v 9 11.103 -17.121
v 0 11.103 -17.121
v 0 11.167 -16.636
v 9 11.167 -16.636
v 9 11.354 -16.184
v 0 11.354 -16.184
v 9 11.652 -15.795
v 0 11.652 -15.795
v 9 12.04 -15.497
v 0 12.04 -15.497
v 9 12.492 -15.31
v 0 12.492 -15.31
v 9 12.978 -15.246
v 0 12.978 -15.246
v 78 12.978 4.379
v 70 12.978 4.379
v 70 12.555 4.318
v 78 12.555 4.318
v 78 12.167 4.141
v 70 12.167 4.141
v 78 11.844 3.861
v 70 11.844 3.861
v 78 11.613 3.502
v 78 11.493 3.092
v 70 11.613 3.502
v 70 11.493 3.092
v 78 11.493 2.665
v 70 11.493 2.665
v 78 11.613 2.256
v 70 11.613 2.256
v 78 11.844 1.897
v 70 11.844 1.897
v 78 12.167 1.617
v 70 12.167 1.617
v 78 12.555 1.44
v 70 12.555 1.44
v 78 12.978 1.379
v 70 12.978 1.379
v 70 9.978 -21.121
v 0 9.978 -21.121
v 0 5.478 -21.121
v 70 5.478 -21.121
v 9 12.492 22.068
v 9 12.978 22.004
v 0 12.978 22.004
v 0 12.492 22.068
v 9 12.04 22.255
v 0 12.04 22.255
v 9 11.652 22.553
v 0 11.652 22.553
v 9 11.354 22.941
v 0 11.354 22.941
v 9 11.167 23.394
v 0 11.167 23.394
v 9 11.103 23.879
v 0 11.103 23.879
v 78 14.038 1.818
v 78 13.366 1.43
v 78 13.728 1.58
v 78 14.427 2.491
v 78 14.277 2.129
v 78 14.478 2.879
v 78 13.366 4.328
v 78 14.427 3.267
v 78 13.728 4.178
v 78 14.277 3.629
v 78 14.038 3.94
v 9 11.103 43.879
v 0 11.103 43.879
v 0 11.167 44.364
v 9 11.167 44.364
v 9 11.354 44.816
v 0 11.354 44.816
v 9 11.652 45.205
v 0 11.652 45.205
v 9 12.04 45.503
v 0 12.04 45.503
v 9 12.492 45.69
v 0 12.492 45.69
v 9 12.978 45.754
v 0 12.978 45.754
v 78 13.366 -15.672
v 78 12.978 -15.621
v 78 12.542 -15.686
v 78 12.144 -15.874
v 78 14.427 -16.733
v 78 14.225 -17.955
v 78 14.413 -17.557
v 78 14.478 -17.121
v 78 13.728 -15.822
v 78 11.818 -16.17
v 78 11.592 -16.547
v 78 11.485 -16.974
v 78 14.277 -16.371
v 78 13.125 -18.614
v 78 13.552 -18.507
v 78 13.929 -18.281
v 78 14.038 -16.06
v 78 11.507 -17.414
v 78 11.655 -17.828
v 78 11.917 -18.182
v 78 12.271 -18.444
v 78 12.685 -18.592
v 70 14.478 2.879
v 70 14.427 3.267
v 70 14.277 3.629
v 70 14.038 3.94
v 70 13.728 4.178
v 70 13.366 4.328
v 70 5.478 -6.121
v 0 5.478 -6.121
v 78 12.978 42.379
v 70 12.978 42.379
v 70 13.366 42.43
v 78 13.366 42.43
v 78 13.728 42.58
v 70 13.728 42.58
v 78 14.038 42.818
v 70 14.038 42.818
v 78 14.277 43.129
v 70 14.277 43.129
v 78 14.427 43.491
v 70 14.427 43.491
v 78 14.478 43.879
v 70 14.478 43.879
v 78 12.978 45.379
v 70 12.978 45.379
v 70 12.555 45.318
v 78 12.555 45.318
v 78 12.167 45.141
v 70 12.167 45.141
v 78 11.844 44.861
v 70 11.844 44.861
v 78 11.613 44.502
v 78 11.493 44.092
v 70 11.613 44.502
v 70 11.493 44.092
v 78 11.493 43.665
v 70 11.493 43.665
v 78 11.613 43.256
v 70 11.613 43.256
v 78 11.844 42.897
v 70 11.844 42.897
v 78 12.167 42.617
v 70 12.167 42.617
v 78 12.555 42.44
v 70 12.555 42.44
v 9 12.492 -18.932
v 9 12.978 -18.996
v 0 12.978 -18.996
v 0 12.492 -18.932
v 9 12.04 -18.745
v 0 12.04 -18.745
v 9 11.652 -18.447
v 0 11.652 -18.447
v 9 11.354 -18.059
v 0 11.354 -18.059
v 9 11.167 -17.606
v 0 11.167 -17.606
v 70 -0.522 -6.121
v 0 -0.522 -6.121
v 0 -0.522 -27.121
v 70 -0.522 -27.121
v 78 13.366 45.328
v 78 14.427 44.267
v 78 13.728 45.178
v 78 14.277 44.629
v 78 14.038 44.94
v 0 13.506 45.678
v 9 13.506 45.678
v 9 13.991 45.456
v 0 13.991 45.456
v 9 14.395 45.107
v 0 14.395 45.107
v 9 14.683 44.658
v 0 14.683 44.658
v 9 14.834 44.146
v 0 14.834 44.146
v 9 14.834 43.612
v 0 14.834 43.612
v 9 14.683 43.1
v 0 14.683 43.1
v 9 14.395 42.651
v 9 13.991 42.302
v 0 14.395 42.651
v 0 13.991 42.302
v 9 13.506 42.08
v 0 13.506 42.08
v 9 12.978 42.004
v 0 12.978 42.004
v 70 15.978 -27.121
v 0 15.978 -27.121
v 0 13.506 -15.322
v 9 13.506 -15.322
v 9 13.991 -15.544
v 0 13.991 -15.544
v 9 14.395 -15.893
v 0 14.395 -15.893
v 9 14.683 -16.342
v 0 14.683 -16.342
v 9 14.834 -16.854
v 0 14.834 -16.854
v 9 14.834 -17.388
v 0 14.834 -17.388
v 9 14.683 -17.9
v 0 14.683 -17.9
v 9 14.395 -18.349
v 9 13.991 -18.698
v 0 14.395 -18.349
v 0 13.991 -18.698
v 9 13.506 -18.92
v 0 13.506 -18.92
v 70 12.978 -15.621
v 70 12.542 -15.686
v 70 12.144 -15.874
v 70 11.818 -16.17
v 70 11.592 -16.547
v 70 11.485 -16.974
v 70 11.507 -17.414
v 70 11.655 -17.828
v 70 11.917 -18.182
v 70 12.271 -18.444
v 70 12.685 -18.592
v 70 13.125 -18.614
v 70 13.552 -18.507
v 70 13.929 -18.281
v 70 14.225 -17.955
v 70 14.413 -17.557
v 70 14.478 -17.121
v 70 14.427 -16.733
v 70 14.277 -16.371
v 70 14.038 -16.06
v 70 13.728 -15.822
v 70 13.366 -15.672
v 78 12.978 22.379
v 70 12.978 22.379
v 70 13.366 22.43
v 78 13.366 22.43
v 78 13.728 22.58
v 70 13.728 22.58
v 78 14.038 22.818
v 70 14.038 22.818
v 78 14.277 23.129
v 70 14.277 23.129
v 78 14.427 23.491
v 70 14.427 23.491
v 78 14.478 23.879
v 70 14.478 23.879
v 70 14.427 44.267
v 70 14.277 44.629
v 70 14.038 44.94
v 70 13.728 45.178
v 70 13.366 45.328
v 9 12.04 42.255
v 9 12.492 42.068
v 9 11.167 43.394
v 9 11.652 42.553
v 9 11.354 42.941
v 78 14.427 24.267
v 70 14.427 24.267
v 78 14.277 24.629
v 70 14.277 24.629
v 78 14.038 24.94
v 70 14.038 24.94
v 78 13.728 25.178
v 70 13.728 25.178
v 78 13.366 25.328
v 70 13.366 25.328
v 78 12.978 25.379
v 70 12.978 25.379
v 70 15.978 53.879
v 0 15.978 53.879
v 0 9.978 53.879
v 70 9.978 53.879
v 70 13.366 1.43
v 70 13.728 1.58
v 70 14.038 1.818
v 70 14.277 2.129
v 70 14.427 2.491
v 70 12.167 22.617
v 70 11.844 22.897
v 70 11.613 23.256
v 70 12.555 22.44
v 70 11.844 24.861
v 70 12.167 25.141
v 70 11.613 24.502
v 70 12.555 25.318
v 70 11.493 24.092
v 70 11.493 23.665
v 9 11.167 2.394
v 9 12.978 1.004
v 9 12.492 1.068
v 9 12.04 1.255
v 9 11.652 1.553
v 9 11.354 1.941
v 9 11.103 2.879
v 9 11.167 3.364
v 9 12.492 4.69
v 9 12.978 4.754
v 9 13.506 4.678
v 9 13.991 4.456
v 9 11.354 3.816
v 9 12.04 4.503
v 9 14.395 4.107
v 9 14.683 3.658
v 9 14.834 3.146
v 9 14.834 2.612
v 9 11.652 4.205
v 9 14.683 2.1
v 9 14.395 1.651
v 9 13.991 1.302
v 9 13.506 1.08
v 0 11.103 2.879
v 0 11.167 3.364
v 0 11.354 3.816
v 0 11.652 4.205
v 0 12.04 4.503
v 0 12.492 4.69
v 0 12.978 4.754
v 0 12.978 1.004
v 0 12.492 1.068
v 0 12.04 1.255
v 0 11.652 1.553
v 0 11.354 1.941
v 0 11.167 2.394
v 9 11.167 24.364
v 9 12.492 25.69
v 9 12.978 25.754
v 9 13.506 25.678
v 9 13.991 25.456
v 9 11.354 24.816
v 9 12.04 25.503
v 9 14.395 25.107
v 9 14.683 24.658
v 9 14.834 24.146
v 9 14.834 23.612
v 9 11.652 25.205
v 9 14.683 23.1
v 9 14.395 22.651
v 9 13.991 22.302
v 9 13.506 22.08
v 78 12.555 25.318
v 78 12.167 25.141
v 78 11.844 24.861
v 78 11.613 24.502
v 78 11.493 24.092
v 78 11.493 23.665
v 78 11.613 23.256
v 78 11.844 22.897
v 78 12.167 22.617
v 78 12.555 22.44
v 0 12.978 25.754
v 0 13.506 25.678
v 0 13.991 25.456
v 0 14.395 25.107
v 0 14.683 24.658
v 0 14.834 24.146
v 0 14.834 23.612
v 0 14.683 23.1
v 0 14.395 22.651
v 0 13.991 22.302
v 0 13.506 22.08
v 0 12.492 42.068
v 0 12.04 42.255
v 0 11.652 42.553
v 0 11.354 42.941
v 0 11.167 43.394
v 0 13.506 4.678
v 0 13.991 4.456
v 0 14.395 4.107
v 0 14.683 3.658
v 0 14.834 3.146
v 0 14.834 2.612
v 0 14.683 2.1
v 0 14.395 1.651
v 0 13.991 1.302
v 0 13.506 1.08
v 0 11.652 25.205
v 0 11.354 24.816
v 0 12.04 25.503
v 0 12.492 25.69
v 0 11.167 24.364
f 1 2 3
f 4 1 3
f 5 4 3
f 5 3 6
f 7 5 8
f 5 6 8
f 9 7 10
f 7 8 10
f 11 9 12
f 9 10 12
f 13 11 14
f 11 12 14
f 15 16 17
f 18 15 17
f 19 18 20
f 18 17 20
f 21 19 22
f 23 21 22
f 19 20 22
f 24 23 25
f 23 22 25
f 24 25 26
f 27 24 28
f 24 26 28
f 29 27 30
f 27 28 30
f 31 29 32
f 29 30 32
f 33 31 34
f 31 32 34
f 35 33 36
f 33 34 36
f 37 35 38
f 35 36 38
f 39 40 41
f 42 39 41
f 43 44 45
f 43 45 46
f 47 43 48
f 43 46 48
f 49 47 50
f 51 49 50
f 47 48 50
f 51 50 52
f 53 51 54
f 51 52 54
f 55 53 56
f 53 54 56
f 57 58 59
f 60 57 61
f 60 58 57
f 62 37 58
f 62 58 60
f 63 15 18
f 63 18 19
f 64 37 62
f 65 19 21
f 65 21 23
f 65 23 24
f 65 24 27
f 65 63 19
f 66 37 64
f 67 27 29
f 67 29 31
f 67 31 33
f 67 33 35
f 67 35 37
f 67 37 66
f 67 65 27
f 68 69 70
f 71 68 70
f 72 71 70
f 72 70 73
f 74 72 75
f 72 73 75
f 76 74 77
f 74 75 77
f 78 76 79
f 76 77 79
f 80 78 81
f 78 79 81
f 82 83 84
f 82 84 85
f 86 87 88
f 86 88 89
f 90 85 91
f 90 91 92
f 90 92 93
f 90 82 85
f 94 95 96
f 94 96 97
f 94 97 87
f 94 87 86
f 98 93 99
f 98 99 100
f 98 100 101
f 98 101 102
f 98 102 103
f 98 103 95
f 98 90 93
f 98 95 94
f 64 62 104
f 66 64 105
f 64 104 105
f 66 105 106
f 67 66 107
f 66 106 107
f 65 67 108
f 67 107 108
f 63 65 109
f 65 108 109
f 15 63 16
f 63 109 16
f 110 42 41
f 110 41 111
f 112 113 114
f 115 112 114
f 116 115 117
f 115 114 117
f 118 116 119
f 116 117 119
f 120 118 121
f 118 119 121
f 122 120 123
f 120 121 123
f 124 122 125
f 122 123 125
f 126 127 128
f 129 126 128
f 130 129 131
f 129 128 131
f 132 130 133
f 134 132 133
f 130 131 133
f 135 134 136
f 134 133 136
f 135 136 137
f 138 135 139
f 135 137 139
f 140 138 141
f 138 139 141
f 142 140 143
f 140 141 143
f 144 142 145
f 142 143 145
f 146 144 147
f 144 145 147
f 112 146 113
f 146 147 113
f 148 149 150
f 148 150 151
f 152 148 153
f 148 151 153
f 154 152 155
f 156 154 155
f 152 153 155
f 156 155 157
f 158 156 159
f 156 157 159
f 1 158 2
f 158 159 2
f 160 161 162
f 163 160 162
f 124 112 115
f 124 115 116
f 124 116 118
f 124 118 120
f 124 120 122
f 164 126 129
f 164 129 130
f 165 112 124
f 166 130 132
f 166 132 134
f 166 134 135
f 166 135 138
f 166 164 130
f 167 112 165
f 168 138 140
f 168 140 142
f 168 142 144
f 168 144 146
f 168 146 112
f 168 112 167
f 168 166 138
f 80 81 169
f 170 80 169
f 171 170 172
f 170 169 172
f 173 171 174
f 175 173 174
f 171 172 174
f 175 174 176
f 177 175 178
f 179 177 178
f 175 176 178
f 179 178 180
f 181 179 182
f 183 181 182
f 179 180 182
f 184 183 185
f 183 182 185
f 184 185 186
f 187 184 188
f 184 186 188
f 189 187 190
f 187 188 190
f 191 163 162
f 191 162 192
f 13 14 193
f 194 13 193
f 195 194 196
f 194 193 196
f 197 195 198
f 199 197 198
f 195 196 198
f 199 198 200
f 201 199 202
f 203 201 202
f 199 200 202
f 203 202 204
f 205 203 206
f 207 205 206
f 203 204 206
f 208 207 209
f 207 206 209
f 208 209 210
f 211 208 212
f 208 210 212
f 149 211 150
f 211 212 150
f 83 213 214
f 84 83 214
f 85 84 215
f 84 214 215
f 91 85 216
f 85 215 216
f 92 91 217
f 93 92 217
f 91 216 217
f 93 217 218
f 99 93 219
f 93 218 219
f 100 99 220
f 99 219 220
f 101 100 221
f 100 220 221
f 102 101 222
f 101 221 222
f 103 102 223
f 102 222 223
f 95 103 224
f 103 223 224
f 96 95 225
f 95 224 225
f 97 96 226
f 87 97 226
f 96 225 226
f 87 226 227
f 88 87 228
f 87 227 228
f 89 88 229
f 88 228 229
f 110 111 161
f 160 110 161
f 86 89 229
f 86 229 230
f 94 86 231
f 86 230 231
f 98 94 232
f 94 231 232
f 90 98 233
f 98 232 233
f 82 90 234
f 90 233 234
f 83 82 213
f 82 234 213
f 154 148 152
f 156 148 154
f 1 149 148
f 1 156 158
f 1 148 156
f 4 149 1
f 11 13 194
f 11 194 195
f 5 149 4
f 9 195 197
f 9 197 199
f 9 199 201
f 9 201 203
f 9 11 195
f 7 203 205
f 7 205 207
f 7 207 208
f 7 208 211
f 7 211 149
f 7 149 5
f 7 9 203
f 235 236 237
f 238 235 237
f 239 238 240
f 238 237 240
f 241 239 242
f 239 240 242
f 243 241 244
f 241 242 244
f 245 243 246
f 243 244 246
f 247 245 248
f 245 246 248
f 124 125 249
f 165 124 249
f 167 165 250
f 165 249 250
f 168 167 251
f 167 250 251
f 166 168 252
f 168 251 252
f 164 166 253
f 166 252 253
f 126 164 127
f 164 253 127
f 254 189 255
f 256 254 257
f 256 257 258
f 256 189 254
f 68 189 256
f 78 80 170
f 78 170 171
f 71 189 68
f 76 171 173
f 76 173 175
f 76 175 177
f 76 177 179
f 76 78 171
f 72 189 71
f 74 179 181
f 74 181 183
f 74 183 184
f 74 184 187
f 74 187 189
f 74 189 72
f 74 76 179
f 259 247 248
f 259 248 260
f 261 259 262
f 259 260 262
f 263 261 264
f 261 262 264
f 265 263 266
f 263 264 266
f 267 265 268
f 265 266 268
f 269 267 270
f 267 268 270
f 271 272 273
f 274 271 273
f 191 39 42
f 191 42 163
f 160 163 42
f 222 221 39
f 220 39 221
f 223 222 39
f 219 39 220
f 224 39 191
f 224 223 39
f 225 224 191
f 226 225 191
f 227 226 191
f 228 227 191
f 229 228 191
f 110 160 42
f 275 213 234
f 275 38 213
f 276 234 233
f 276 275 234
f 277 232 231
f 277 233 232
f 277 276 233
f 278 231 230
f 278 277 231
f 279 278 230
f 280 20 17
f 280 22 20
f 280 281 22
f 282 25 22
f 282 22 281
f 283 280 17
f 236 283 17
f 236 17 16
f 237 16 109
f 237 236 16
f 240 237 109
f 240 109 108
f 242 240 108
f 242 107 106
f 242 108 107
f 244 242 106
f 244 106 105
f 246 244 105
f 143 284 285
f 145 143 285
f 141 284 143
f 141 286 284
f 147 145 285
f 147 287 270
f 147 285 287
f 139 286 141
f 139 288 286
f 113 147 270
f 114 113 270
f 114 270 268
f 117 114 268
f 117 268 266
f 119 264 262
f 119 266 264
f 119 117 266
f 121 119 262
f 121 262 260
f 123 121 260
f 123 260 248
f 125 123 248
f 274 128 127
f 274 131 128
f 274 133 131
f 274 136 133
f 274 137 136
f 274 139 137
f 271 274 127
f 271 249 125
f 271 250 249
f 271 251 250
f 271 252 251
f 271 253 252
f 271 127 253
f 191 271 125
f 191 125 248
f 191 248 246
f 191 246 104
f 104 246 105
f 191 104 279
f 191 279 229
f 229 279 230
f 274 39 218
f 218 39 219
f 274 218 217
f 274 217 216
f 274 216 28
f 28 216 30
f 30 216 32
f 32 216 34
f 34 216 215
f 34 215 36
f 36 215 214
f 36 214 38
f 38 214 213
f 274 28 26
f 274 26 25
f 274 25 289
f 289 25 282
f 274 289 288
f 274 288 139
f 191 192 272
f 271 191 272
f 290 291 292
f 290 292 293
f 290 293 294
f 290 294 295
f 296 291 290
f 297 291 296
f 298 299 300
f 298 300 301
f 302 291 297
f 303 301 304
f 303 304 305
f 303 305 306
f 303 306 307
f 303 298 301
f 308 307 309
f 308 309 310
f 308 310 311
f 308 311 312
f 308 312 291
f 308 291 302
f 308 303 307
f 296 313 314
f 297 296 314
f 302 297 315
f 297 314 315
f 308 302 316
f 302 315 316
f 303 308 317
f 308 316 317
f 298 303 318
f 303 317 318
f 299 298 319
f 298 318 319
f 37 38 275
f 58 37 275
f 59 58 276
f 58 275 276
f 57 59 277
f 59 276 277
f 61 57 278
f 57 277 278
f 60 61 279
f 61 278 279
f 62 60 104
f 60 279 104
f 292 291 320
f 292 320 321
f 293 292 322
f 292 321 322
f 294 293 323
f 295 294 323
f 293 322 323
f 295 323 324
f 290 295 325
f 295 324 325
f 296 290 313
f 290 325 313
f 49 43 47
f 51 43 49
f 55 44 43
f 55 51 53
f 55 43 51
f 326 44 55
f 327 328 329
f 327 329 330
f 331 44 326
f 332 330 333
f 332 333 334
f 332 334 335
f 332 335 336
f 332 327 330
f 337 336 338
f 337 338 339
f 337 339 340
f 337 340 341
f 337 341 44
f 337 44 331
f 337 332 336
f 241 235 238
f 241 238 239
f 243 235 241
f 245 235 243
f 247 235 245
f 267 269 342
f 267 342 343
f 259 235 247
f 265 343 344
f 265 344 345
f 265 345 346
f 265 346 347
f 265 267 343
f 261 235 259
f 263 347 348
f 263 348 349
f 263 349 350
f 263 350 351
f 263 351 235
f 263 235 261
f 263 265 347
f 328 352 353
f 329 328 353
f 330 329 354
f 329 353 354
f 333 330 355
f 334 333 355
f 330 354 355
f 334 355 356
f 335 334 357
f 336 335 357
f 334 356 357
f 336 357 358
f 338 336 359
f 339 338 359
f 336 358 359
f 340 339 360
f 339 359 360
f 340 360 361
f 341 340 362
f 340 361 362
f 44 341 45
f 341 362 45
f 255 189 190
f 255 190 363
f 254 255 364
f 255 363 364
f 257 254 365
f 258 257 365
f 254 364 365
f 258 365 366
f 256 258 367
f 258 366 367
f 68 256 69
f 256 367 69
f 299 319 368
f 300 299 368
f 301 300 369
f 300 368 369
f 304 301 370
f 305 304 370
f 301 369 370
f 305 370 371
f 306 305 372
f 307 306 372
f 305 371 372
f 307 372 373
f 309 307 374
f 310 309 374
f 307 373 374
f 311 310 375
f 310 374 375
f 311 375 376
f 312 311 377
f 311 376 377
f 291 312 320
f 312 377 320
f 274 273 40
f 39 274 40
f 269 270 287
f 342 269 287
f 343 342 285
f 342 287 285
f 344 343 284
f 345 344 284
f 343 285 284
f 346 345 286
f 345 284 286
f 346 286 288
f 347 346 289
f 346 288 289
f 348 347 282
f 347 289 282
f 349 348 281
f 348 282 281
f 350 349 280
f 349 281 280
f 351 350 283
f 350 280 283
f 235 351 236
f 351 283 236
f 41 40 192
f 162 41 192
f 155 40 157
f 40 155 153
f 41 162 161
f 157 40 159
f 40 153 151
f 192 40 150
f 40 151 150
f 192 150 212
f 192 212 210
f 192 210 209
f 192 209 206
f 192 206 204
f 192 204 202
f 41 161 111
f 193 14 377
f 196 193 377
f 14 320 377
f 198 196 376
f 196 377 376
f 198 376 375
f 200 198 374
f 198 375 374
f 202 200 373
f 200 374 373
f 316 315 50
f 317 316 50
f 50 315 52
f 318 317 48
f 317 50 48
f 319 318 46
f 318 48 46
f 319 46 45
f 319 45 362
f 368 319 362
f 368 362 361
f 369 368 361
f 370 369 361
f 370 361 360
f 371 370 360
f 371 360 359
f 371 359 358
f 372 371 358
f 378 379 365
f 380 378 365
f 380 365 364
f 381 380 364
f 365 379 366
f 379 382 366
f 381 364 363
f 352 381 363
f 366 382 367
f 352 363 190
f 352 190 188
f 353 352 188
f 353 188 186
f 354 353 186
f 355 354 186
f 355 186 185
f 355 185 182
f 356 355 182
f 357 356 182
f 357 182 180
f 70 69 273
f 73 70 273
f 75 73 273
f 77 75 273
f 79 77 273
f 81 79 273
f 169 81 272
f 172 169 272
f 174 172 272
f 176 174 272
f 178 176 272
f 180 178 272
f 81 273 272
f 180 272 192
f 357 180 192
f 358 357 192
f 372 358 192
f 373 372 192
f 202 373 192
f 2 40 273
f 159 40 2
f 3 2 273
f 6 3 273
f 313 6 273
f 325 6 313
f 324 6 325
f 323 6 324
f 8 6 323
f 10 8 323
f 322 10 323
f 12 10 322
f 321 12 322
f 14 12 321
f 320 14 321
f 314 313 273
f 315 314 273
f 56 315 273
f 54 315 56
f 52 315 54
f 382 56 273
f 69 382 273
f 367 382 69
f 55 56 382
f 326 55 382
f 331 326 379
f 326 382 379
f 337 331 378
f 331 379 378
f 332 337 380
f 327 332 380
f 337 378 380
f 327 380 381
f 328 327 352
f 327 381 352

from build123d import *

# Parameters (mm, degrees)
F1_DEPTH = 70
F3_DEPTH = 8
F5_DEPTH = 9


with BuildPart() as f1:
    # F0 (on Right) → F1 (new body)
    with BuildSketch(Plane.YZ):
        Polygon((15.977706, -27.121146), (15.977706, 53.878854), (9.977706, 53.878854), (9.977706, -21.121146), (5.477706, -21.121146), (5.477706, -6.121146), (-0.522294, -6.121146), (-0.522294, -27.121146), align=None)
    extrude(amount=F1_DEPTH)

    # F2 (on face) → F3 (join)
    with BuildSketch(Plane.YZ.offset(70)):
        with BuildLine():
            Line((12.977706, 43.878854), (12.977706, 45.378854))
            ThreePointArc((12.977706, 45.378854), (11.477706, 43.878854), (12.977706, 42.378854))
            Line((12.977706, 42.378854), (12.977706, 43.878854))
        make_face()
        with BuildLine():
            ThreePointArc((12.977706, 42.378854), (14.038366, 42.818193), (14.477706, 43.878854))
            ThreePointArc((14.477706, 43.878854), (14.038366, 44.939514), (12.977706, 45.378854))
            Line((12.977706, 45.378854), (12.977706, 43.878854))
            Line((12.977706, 43.878854), (12.977706, 42.378854))
        make_face()
        with BuildLine():
            Line((12.977706, 23.878854), (12.977706, 25.378854))
            ThreePointArc((12.977706, 25.378854), (11.477706, 23.878854), (12.977706, 22.378854))
            Line((12.977706, 22.378854), (12.977706, 23.878854))
        make_face()
        with BuildLine():
            ThreePointArc((14.477706, 23.878854), (14.038366, 24.939514), (12.977706, 25.378854))
            Line((12.977706, 25.378854), (12.977706, 23.878854))
            Line((12.977706, 23.878854), (12.977706, 22.378854))
            ThreePointArc((12.977706, 22.378854), (14.038366, 22.818193), (14.477706, 23.878854))
        make_face()
        with BuildLine():
            Line((12.977706, 2.878854), (12.977706, 4.378854))
            ThreePointArc((12.977706, 4.378854), (11.477706, 2.878854), (12.977706, 1.378854))
            Line((12.977706, 1.378854), (12.977706, 2.878854))
        make_face()
        with BuildLine():
            ThreePointArc((14.477706, 2.878854), (14.038366, 3.939514), (12.977706, 4.378854))
            Line((12.977706, 4.378854), (12.977706, 2.878854))
            Line((12.977706, 2.878854), (12.977706, 1.378854))
            ThreePointArc((12.977706, 1.378854), (14.038366, 1.818193), (14.477706, 2.878854))
        make_face()
        with BuildLine():
            ThreePointArc((14.477706, -17.121146), (14.038366, -16.060486), (12.977706, -15.621146))
            ThreePointArc((12.977706, -15.621146), (11.917046, -18.181807), (14.477706, -17.121146))
        make_face()
    extrude(amount=F3_DEPTH)

    # F4 (on face) → F5 (cut)
    with BuildSketch(Plane(origin=(0, 0, 0), x_dir=(0, -1, 0), z_dir=(-1, 0, 0))):
        with BuildLine():
            Line((-12.977706, 43.878854), (-12.977706, 45.753854))
            ThreePointArc((-12.977706, 45.753854), (-14.852706, 43.878854), (-12.977706, 42.003854))
            Line((-12.977706, 42.003854), (-12.977706, 43.878854))
        make_face()
        with BuildLine():
            ThreePointArc((-12.977706, 42.003854), (-11.651881, 42.553028), (-11.102706, 43.878854))
            ThreePointArc((-11.102706, 43.878854), (-11.651881, 45.204679), (-12.977706, 45.753854))
            Line((-12.977706, 45.753854), (-12.977706, 43.878854))
            Line((-12.977706, 43.878854), (-12.977706, 42.003854))
        make_face()
        with BuildLine():
            Line((-12.977706, 23.878854), (-12.977706, 25.753854))
            ThreePointArc((-12.977706, 25.753854), (-14.852706, 23.878854), (-12.977706, 22.003854))
            Line((-12.977706, 22.003854), (-12.977706, 23.878854))
        make_face()
        with BuildLine():
            ThreePointArc((-11.102706, 23.878854), (-11.651881, 25.204679), (-12.977706, 25.753854))
            Line((-12.977706, 25.753854), (-12.977706, 23.878854))
            Line((-12.977706, 23.878854), (-12.977706, 22.003854))
            ThreePointArc((-12.977706, 22.003854), (-11.651881, 22.553028), (-11.102706, 23.878854))
        make_face()
        with BuildLine():
            Line((-12.977706, 2.878854), (-12.977706, 4.753854))
            ThreePointArc((-12.977706, 4.753854), (-14.852706, 2.878854), (-12.977706, 1.003854))
            Line((-12.977706, 1.003854), (-12.977706, 2.878854))
        make_face()
        with BuildLine():
            ThreePointArc((-11.102706, 2.878854), (-11.651881, 4.204679), (-12.977706, 4.753854))
            Line((-12.977706, 4.753854), (-12.977706, 2.878854))
            Line((-12.977706, 2.878854), (-12.977706, 1.003854))
            ThreePointArc((-12.977706, 1.003854), (-11.651881, 1.553028), (-11.102706, 2.878854))
        make_face()
        with BuildLine():
            ThreePointArc((-12.977706, -15.246146), (-14.852706, -17.121146), (-12.977706, -18.996146))
            Line((-12.977706, -18.996146), (-12.977706, -17.121146))
            Line((-12.977706, -17.121146), (-12.977706, -15.246146))
        make_face()
        with BuildLine():
            Line((-12.977706, -17.121146), (-12.977706, -18.996146))
            ThreePointArc((-12.977706, -18.996146), (-11.651881, -18.446972), (-11.102706, -17.121146))
            ThreePointArc((-11.102706, -17.121146), (-11.651881, -15.795321), (-12.977706, -15.246146))
            Line((-12.977706, -15.246146), (-12.977706, -17.121146))
        make_face()
    extrude(amount=-F5_DEPTH, mode=Mode.SUBTRACT)


solid = f1.part
